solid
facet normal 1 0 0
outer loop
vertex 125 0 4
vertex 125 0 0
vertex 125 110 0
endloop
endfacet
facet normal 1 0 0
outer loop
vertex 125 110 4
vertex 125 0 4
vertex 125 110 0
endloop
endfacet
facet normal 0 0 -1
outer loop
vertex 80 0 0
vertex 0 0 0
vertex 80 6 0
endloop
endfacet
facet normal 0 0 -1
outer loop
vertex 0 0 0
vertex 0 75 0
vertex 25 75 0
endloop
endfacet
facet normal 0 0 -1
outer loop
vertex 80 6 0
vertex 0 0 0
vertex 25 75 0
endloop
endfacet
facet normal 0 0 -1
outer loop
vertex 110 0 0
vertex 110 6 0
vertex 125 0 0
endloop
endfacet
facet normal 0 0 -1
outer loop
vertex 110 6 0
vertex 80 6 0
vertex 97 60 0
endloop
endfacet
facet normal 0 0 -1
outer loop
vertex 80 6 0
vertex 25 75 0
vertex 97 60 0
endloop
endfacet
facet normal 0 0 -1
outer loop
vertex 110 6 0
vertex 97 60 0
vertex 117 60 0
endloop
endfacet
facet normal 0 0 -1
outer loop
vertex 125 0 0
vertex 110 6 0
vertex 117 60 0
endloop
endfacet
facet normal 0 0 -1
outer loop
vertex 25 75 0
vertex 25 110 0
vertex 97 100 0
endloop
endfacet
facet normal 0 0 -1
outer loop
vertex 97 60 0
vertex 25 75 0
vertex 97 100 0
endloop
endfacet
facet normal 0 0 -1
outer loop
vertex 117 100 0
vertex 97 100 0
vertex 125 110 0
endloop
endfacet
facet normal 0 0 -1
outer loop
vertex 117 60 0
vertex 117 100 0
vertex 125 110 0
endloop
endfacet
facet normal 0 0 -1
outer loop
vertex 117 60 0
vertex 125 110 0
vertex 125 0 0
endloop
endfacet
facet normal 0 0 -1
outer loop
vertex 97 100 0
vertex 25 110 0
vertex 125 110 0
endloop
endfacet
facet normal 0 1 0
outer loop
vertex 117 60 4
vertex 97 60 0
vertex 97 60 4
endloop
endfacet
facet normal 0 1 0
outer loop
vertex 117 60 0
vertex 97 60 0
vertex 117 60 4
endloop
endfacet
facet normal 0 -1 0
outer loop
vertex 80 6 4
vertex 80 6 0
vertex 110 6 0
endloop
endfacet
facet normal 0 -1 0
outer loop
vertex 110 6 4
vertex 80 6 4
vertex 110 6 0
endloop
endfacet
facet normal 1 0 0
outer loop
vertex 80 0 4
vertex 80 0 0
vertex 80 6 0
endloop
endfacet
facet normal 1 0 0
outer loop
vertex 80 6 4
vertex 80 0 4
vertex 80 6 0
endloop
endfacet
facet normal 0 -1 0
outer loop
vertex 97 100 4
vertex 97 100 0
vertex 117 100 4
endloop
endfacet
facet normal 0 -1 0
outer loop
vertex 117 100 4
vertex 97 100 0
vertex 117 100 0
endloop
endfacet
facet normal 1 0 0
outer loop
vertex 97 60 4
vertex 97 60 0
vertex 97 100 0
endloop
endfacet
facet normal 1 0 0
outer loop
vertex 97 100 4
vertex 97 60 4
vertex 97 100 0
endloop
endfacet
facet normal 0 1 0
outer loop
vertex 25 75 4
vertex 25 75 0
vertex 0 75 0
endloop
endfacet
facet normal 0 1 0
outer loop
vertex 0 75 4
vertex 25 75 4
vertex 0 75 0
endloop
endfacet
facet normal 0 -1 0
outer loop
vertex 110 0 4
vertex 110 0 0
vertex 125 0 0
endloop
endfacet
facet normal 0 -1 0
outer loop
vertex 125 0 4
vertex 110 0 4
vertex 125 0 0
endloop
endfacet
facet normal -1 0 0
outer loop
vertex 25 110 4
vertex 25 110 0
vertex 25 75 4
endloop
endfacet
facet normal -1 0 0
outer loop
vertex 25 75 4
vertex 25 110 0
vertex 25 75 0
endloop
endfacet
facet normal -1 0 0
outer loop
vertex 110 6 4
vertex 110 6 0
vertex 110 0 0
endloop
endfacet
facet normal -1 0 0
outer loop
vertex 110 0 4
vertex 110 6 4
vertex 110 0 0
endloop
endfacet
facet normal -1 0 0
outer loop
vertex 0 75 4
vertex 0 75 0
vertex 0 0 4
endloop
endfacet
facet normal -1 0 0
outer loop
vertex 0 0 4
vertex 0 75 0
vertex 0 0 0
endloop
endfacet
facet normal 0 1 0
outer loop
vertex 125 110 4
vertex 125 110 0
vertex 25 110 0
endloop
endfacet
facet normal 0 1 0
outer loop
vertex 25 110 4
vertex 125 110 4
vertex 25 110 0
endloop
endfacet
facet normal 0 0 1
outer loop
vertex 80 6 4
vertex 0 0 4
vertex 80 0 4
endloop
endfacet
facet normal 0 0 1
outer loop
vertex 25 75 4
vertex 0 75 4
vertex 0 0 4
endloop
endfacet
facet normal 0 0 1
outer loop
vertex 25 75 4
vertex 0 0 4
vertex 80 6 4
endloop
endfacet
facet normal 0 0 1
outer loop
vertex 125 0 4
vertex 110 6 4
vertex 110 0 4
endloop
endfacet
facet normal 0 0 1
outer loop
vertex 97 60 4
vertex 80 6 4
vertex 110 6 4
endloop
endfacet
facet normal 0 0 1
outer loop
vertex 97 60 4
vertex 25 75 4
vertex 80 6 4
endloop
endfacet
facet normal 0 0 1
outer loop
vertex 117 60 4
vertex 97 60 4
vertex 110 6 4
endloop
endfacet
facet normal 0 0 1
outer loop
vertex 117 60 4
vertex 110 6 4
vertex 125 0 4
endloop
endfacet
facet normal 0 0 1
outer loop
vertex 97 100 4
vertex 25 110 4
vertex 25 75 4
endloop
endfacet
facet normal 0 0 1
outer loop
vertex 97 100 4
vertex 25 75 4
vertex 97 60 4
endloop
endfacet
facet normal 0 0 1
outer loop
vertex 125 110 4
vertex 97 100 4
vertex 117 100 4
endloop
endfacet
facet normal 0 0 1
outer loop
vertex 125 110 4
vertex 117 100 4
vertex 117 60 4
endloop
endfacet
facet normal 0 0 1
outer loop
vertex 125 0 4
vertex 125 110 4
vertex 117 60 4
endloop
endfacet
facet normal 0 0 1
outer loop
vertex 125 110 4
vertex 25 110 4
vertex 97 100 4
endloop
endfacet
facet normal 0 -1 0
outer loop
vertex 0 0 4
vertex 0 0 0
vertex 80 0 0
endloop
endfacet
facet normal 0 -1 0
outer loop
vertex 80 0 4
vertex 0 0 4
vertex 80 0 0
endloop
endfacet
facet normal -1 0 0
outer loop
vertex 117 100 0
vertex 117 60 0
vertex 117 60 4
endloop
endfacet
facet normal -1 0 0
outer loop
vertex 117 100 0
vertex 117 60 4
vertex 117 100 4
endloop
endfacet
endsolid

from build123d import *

# Parameters (mm, degrees)
SKIZZE1_W                       = 20
SKIZZE1_H                       = 40
AUFSATZ_LINEAR_AUSTRAGEN1_DEPTH = 4


with BuildPart() as part:
    # Skizze1 → Aufsatz-Linear austragen1 (new body)
    with BuildSketch(Plane.XY):
        Polygon((0, 0), (80, 0), (80, 6), (110, 6), (110, 0), (125, 0), (125, 110), (25, 110), (25, 75), (0, 75), align=None)
        with Locations((107, 80)):
            Rectangle(SKIZZE1_W, SKIZZE1_H, mode=Mode.SUBTRACT)
    extrude(amount=AUFSATZ_LINEAR_AUSTRAGEN1_DEPTH)


solid = part.part
